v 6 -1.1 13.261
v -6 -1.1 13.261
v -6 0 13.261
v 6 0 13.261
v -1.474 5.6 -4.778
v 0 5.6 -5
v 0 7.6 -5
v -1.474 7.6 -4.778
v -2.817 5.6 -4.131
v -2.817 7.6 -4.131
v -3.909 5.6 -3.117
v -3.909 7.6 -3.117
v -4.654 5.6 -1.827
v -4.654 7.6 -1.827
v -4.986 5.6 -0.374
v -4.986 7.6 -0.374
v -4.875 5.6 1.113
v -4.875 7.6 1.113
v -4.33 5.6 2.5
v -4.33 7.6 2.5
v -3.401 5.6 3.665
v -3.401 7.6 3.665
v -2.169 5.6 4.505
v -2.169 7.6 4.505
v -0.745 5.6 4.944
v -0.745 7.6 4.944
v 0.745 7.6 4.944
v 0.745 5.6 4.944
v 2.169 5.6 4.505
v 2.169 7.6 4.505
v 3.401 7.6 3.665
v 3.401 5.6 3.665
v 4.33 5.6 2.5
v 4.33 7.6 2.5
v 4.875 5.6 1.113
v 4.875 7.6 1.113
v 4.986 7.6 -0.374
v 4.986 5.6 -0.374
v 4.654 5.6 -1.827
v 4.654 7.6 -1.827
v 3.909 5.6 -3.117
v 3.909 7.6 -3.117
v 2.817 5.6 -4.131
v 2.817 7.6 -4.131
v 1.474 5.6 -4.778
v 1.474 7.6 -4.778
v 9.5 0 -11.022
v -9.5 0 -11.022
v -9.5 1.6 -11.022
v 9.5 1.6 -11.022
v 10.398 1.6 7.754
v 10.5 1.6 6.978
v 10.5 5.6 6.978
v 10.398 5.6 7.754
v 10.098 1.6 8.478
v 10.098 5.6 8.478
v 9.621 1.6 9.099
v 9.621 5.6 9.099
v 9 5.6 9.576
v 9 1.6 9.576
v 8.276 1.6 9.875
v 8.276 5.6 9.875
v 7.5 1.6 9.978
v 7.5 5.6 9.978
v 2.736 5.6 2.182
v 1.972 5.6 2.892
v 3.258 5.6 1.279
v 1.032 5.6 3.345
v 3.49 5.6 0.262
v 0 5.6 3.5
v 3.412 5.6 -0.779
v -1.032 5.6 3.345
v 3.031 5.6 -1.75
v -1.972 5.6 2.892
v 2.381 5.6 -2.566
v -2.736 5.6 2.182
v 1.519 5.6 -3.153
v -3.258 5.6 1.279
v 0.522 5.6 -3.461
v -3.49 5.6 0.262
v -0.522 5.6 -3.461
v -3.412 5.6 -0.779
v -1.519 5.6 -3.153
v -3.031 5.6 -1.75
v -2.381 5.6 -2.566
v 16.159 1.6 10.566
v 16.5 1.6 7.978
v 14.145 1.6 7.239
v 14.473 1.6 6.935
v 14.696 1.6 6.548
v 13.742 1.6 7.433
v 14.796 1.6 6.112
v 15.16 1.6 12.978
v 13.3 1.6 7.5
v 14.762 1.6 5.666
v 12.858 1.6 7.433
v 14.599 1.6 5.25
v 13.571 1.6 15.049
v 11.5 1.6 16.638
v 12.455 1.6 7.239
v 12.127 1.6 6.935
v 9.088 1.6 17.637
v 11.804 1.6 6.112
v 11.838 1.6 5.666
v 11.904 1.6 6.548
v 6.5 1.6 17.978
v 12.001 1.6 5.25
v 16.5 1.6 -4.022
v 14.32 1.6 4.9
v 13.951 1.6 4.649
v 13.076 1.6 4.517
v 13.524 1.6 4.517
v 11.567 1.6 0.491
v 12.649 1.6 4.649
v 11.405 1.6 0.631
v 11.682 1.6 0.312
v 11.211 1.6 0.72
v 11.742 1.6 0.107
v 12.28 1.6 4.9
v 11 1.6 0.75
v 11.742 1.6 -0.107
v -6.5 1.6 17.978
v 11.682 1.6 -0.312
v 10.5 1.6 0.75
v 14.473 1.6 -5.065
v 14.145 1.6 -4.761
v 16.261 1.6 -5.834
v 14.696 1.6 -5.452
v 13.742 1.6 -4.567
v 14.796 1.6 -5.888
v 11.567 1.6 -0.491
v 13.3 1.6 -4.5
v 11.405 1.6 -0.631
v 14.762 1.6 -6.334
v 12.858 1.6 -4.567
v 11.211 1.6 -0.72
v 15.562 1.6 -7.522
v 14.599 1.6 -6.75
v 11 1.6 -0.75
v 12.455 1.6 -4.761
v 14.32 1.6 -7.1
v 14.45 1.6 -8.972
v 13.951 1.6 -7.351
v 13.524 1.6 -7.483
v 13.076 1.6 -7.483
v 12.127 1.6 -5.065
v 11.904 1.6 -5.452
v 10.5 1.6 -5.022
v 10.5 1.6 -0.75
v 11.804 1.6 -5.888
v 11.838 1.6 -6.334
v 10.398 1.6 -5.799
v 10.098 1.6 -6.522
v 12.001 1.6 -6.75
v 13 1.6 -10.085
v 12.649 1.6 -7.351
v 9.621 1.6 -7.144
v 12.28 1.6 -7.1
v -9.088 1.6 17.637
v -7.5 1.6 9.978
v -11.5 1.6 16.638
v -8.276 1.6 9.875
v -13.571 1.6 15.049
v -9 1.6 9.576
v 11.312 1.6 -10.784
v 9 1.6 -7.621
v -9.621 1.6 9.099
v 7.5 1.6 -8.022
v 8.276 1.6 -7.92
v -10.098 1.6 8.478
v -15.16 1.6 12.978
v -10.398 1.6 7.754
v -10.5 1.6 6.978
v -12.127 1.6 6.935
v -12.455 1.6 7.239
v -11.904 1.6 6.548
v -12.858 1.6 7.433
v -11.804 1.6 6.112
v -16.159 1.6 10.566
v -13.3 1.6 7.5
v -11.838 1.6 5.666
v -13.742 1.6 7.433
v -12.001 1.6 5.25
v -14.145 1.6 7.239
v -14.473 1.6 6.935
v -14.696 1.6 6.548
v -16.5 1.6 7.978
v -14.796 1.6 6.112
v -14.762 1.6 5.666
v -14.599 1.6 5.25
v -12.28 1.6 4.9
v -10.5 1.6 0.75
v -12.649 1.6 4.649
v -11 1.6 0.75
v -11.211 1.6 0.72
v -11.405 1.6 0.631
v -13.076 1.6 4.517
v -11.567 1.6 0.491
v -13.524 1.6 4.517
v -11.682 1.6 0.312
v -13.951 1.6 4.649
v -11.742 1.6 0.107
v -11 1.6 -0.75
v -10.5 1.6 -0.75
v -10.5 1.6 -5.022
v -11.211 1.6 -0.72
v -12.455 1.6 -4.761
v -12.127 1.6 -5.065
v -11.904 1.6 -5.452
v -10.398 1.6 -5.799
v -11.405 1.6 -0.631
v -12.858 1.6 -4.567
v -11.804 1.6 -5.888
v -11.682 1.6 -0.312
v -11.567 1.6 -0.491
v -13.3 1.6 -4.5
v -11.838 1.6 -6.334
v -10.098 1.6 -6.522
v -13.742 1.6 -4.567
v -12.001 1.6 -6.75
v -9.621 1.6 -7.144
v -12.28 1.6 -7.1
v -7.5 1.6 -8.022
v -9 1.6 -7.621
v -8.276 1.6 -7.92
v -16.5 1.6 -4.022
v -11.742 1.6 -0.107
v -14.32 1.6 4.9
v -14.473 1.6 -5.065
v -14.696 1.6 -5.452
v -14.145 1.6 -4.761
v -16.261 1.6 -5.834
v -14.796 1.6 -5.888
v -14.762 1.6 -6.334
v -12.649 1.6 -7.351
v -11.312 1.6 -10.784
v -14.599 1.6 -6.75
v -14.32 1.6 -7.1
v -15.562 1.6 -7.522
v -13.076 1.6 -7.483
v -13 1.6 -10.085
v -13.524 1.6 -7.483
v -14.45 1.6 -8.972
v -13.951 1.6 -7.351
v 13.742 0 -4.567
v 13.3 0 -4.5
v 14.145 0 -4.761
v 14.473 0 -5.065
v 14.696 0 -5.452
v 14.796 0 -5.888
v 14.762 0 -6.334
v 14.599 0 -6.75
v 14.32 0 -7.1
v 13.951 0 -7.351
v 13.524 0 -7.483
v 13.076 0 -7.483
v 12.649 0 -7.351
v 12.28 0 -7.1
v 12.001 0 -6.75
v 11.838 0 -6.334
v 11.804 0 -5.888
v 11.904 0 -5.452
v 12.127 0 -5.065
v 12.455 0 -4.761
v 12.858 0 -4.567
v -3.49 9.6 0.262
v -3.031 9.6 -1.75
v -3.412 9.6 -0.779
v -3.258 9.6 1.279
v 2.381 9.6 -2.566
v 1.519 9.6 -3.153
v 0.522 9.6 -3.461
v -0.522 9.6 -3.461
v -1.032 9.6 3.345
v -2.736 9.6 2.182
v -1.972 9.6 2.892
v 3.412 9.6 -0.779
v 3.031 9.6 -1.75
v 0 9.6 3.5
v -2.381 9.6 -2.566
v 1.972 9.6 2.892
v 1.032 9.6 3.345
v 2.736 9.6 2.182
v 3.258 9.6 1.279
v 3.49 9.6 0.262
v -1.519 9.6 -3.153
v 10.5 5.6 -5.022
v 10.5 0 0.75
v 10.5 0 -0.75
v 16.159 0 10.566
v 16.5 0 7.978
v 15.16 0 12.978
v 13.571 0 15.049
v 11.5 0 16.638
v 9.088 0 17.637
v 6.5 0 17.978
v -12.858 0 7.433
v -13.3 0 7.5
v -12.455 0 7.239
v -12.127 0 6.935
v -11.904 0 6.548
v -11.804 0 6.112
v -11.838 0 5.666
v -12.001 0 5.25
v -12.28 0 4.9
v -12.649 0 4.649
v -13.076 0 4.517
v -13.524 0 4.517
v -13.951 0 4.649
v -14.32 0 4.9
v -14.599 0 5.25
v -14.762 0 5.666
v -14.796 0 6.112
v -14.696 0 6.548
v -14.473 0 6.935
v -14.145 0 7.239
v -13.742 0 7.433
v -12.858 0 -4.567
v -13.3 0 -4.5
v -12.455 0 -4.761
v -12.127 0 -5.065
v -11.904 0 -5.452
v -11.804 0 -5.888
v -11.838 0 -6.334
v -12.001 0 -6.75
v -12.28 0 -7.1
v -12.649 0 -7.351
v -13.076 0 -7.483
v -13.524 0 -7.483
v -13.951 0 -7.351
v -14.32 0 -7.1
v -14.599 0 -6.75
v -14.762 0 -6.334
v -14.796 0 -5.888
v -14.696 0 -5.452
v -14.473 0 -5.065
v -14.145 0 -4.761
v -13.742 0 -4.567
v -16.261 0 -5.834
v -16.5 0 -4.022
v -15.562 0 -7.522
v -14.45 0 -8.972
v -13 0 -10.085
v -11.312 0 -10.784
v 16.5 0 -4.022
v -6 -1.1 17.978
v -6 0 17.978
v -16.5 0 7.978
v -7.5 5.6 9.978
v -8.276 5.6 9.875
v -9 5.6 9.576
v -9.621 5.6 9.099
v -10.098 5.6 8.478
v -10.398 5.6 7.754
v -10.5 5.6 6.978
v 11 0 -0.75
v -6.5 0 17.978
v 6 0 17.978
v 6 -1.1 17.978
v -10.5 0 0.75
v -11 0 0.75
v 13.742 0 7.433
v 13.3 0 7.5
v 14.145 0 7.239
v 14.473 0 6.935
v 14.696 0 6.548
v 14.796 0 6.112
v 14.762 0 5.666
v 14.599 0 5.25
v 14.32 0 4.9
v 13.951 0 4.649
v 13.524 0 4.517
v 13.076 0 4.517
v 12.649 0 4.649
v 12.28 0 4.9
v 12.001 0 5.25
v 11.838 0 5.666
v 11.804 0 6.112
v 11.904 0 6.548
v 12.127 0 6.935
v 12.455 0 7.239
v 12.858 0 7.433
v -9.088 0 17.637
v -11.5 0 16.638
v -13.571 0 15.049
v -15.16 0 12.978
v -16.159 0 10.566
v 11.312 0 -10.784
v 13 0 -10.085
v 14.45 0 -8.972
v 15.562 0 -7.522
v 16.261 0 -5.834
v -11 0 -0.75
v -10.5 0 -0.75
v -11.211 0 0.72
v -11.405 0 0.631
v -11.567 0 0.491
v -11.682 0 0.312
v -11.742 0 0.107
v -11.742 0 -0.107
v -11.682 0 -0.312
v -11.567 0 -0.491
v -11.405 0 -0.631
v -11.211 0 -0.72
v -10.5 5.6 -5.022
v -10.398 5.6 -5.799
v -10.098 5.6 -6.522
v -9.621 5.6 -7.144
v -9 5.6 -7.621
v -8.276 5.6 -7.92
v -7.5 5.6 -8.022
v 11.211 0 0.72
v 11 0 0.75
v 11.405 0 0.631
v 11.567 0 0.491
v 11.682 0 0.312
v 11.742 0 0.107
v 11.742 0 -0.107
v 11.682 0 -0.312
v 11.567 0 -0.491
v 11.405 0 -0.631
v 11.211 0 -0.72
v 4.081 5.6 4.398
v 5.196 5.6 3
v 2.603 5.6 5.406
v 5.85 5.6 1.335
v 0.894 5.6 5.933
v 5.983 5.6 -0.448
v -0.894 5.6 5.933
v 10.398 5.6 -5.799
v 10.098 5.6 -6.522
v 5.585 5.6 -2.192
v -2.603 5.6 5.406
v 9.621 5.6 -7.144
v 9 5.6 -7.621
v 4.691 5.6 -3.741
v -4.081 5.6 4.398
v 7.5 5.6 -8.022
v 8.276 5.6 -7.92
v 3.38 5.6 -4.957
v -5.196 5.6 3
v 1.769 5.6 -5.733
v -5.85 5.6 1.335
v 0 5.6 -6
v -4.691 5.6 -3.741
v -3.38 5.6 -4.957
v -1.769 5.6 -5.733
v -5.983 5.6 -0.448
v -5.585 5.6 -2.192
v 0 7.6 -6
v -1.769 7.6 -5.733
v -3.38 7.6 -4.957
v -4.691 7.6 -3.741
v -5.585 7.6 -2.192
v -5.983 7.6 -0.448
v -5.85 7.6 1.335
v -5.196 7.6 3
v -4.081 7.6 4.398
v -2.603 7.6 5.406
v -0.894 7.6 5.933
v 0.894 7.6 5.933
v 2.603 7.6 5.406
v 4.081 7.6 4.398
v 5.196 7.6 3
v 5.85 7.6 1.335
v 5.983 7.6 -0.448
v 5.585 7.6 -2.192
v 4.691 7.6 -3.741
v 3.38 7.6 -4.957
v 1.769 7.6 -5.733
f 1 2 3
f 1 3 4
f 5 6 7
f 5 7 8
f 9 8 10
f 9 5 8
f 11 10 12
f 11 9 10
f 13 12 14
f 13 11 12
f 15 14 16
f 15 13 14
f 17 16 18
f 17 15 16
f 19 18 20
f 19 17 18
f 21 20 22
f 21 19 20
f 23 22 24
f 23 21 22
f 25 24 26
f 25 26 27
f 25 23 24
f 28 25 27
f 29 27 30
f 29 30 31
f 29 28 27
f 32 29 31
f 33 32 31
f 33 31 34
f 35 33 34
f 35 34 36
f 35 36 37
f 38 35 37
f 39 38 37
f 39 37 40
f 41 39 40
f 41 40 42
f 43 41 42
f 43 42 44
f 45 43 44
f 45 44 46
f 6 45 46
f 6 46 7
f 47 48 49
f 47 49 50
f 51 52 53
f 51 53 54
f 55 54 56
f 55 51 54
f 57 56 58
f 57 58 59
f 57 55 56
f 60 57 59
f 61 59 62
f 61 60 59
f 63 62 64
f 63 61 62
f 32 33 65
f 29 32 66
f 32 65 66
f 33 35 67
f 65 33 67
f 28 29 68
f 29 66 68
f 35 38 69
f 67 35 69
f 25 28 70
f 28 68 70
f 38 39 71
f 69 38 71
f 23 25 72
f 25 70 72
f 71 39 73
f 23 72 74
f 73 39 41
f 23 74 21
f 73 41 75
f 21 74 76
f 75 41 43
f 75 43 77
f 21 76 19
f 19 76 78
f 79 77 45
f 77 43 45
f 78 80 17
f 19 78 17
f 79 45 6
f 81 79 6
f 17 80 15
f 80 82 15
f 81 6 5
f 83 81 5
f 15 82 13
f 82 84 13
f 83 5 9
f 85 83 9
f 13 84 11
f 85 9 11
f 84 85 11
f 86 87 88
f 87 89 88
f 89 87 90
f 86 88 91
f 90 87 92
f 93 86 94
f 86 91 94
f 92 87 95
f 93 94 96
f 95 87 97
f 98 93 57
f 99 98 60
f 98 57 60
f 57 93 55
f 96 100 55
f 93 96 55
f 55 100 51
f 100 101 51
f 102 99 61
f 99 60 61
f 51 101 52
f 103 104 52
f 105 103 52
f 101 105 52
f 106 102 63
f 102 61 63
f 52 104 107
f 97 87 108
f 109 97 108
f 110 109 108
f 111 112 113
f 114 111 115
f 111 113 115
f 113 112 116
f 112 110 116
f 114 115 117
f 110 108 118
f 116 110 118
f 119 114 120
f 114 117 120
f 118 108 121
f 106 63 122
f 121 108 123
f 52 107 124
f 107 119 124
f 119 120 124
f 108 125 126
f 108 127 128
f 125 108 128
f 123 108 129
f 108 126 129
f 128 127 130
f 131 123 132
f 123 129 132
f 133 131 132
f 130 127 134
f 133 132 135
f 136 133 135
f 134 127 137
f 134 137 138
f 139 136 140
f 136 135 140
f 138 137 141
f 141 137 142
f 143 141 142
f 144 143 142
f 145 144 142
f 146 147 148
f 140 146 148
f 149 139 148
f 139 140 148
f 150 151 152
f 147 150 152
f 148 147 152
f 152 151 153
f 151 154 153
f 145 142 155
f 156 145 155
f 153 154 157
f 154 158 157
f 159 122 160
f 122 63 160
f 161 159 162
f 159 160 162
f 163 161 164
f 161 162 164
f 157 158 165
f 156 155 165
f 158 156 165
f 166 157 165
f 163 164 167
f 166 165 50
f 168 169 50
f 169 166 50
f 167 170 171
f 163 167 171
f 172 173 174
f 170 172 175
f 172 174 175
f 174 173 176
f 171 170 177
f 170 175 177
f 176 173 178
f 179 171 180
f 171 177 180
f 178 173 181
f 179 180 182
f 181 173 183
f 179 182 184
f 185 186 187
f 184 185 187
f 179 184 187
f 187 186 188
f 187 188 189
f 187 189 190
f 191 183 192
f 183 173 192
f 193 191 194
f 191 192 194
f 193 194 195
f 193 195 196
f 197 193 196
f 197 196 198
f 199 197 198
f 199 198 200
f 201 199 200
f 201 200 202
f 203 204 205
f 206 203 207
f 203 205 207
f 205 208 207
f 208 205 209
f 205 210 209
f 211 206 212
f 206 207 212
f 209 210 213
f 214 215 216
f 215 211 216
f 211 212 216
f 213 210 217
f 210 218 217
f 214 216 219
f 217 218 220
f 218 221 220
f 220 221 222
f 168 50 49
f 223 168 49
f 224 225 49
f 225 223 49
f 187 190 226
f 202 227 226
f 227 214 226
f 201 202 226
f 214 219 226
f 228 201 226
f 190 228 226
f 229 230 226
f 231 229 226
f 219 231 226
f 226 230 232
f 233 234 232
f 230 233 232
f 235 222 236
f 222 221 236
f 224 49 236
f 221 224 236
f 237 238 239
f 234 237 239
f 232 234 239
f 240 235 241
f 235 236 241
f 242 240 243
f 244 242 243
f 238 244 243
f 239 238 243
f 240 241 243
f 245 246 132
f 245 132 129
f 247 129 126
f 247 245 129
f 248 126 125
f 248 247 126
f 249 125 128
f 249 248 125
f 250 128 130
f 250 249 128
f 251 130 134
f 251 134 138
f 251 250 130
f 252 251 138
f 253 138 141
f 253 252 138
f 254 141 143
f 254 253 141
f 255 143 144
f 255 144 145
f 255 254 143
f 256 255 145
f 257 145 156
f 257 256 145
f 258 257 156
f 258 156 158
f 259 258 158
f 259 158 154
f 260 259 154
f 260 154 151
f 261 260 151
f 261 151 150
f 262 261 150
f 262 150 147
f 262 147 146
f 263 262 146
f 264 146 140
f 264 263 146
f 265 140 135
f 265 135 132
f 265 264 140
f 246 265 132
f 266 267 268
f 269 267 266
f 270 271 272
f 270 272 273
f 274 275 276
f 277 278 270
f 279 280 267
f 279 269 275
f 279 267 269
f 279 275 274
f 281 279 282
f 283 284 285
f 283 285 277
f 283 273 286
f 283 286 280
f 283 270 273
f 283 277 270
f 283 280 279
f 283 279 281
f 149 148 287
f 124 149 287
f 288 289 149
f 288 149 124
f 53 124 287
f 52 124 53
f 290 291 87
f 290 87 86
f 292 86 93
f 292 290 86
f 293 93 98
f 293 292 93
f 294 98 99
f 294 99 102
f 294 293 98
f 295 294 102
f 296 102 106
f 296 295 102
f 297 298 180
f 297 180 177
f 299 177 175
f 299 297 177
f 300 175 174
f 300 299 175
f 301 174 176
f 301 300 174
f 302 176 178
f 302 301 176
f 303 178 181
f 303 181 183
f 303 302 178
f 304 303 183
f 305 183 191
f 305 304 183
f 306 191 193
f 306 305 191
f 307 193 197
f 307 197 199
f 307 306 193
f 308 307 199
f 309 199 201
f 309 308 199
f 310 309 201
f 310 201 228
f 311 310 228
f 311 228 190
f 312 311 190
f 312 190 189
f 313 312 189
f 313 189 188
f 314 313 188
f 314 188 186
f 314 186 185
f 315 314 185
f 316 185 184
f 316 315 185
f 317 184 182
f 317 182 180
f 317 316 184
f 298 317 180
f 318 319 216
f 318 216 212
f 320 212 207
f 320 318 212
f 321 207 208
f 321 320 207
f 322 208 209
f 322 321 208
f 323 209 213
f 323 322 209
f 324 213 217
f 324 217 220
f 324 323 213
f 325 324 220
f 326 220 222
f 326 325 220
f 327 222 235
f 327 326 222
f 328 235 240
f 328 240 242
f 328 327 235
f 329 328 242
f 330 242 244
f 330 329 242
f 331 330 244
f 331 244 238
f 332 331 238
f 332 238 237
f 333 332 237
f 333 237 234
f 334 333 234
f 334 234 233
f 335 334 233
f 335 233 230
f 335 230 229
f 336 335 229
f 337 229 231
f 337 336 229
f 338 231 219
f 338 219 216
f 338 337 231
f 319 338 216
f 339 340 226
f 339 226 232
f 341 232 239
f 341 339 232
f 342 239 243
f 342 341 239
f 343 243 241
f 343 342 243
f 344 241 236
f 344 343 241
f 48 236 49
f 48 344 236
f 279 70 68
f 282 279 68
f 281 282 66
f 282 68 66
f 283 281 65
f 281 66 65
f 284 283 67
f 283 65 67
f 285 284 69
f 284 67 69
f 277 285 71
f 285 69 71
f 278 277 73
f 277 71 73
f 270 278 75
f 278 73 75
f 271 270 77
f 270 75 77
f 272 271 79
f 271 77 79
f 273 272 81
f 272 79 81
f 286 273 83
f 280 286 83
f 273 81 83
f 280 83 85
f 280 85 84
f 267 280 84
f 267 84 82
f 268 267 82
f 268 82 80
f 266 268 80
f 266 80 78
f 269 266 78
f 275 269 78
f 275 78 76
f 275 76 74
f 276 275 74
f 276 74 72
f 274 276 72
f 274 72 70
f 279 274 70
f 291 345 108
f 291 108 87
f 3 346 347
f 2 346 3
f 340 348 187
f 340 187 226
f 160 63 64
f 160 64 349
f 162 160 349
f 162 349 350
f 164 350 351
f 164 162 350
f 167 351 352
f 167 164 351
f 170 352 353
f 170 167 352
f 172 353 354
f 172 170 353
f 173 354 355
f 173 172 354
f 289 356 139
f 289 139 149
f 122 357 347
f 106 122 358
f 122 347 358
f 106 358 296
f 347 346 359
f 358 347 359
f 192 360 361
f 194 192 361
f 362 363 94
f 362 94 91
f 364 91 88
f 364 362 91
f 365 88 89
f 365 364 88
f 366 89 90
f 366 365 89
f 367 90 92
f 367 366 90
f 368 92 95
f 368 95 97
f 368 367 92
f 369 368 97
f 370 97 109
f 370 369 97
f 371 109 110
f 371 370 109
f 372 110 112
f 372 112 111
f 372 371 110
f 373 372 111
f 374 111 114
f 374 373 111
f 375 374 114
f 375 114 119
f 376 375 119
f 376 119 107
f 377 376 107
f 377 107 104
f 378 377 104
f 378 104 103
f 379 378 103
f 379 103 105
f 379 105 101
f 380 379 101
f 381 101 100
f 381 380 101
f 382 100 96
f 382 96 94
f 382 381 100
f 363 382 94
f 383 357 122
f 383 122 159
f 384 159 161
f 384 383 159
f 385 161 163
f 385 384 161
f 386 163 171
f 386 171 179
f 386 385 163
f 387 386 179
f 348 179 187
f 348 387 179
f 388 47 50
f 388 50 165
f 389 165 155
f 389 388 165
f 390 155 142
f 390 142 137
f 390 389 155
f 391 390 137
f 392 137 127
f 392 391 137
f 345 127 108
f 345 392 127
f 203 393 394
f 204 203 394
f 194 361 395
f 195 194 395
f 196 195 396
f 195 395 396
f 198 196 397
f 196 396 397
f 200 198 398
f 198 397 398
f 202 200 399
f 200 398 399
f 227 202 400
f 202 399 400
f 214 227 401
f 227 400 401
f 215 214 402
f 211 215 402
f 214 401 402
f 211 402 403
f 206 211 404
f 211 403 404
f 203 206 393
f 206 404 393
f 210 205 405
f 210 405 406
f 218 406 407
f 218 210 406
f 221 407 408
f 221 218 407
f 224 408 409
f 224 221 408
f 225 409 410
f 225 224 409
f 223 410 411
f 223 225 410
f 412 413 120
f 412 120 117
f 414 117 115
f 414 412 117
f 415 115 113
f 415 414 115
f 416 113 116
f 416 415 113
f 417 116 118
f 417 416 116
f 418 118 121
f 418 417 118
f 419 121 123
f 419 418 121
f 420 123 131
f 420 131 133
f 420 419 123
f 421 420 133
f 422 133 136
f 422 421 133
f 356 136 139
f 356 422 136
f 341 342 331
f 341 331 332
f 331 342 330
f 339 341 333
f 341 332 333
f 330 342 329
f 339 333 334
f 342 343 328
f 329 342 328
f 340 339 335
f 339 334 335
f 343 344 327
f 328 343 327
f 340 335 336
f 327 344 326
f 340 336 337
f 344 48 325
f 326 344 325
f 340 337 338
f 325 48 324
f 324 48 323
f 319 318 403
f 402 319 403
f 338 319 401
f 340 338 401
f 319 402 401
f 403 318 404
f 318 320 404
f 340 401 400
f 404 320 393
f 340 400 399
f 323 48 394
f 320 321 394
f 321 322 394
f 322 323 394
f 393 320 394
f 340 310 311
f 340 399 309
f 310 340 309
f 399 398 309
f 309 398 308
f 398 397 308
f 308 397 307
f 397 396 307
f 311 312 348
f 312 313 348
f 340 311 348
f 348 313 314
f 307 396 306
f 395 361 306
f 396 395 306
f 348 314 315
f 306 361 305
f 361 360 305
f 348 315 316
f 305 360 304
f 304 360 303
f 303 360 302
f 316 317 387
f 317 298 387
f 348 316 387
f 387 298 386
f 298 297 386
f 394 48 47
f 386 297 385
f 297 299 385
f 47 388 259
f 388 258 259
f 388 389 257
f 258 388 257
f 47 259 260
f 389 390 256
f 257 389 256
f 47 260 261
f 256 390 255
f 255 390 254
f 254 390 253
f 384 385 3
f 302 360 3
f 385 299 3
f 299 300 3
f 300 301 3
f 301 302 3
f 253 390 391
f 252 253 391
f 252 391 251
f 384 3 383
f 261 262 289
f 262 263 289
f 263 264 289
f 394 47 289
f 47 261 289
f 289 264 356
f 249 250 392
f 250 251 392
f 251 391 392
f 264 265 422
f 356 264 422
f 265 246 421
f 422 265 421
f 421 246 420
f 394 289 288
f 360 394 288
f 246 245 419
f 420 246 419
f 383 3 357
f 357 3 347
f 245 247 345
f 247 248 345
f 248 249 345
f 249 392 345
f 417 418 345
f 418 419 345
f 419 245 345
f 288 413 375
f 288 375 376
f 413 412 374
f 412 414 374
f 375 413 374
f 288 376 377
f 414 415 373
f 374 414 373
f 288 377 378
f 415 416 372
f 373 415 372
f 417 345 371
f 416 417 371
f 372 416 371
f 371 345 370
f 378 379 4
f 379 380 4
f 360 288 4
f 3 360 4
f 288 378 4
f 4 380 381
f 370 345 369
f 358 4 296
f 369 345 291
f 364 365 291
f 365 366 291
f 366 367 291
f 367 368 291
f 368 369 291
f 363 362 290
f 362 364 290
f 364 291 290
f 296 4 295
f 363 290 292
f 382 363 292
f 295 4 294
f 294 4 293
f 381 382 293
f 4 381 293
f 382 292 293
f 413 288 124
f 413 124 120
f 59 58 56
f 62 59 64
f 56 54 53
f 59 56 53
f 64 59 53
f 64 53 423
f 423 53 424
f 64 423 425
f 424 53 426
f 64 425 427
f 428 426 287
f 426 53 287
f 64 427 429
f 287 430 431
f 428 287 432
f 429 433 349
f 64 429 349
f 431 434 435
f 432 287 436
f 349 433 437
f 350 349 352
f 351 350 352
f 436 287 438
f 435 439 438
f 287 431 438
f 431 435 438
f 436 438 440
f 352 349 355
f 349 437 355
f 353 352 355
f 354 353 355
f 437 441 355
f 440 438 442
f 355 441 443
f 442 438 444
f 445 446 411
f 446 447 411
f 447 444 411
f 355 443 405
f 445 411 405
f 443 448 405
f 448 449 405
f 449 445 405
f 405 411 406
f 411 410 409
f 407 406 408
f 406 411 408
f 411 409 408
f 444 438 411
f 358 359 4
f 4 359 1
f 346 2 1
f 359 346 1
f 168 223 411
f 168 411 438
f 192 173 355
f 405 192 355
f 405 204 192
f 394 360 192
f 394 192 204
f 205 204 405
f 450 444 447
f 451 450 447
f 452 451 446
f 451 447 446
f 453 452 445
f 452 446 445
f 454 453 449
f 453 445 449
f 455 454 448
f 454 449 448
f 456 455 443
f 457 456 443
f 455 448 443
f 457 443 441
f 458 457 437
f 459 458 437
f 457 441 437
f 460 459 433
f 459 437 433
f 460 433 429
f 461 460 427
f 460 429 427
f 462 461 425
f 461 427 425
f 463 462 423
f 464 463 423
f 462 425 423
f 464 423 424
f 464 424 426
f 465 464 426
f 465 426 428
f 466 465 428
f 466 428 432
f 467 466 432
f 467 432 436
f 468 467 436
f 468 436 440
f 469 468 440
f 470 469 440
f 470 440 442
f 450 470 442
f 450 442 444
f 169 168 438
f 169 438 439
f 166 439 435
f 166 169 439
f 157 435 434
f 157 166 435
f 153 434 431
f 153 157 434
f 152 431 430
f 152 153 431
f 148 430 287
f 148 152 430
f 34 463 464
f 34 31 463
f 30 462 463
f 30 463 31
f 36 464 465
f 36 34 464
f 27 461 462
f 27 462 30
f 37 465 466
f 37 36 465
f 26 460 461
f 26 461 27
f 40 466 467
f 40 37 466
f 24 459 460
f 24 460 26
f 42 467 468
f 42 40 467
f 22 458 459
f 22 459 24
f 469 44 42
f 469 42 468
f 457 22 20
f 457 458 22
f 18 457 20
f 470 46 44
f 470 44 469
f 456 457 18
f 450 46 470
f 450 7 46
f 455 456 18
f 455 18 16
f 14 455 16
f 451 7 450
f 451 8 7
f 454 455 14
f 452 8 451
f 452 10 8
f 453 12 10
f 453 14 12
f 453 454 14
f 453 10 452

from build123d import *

# Parameters (mm, degrees)
SKETCH_1_R           = 1.5
EXTRUDE_1_DEPTH      = 1.6
EXTRUDE_2_DEPTH      = 5.6
SKETCH_3_R           = 6
SKETCH_3_R_2         = 5
EXTRUDE_3_DEPTH      = 7.6
SKETCH_4_R           = 3.5
SKETCH_4_R_2         = 2.75
EXTRUDE_4_DEPTH      = 9.6
SKETCH_5_R           = 3.5
EXTRUDE_5_DEPTH      = 9.6
EXTRUDE_6_DEPTH      = 0.001
EXTRUDE_6_DEPTH_BACK = 1.1
SKETCH_7_W           = 12
SKETCH_7_H           = 4.716784086


with BuildPart() as part:
    # 草图1 → 凸台-拉伸1 (new body)
    with BuildSketch(Plane(origin=(0, 0, 0), x_dir=(1, 0, 0), z_dir=(0, 1, 0))):
        with BuildLine():
            Line((-9.5, 11.022466342), (9.5, 11.022466342))
            ThreePointArc((9.5, 11.022466342), (14.449747468, 8.97221381), (16.5, 4.022466342))
            Line((16.5, 4.022466342), (16.5, -7.977533658))
            ThreePointArc((16.5, -7.977533658), (13.571067812, -15.04860147), (6.5, -17.977533658))
            Line((6.5, -17.977533658), (-6.5, -17.977533658))
            ThreePointArc((-6.5, -17.977533658), (-13.571067812, -15.04860147), (-16.5, -7.977533658))
            Line((-16.5, -7.977533658), (-16.5, 4.022466342))
            ThreePointArc((-16.5, 4.022466342), (-14.449747468, 8.97221381), (-9.5, 11.022466342))
        make_face()
        with Locations(Location((-13.3, 6, 0), (0, 0, 270))):
            Circle(SKETCH_1_R, mode=Mode.SUBTRACT)
        with Locations(Location((13.3, 6, 0), (0, 0, 270))):
            Circle(SKETCH_1_R, mode=Mode.SUBTRACT)
        with Locations(Location((-13.3, -6, 0), (0, 0, 270))):
            Circle(SKETCH_1_R, mode=Mode.SUBTRACT)
        with Locations(Location((13.3, -6, 0), (0, 0, 270))):
            Circle(SKETCH_1_R, mode=Mode.SUBTRACT)
        with BuildLine():
            Line((-11, 0.75), (-10, 0.75))
            ThreePointArc((-10, 0.75), (-9.25, 0), (-10, -0.75))
            Line((-10, -0.75), (-11, -0.75))
            ThreePointArc((-11, -0.75), (-11.75, 0), (-11, 0.75))
        make_face(mode=Mode.SUBTRACT)
        with BuildLine():
            Line((11, 0.75), (10, 0.75))
            ThreePointArc((10, 0.75), (9.25, 0), (10, -0.75))
            Line((10, -0.75), (11, -0.75))
            ThreePointArc((11, -0.75), (11.75, 0), (11, 0.75))
        make_face(mode=Mode.SUBTRACT)
    extrude(amount=EXTRUDE_1_DEPTH)

    # 草图2 → 凸台-拉伸2 (add)
    with BuildSketch(Plane(origin=(0, 0, 0), x_dir=(1, 0, 0), z_dir=(0, 1, 0))):
        with BuildLine():
            Line((-7.5, 8.022466342), (7.5, 8.022466342))
            ThreePointArc((7.5, 8.022466342), (9.621320344, 7.143786685), (10.5, 5.022466342))
            Line((10.5, 5.022466342), (10.5, -6.977533658))
            ThreePointArc((10.5, -6.977533658), (9.621320344, -9.098854002), (7.5, -9.977533658))
            Line((7.5, -9.977533658), (-7.5, -9.977533658))
            ThreePointArc((-7.5, -9.977533658), (-9.621320344, -9.098854002), (-10.5, -6.977533658))
            Line((-10.5, -6.977533658), (-10.5, 5.022466342))
            ThreePointArc((-10.5, 5.022466342), (-9.621320344, 7.143786685), (-7.5, 8.022466342))
        make_face()
    extrude(amount=EXTRUDE_2_DEPTH)

    # 草图3 → 凸台-拉伸3 (add)
    with BuildSketch(Plane(origin=(0, 0, 0), x_dir=(1, 0, 0), z_dir=(0, 1, 0))):
        with Locations(Location((0, 0, 0), (0, 0, 90))):
            Circle(SKETCH_3_R)
        with Locations(Location((0, 0, 0), (0, 0, 90))):
            Circle(SKETCH_3_R_2, mode=Mode.SUBTRACT)
    extrude(amount=EXTRUDE_3_DEPTH)

    # 草图4 → 凸台-拉伸4 (add)
    with BuildSketch(Plane(origin=(0, 0, 0), x_dir=(1, 0, 0), z_dir=(0, 1, 0))):
        with Locations(Location((0, 0, 0), (0, 0, 270))):
            Circle(SKETCH_4_R)
        with Locations(Location((0, 0, 0), (0, 0, 270))):
            Circle(SKETCH_4_R_2, mode=Mode.SUBTRACT)
    extrude(amount=EXTRUDE_4_DEPTH)

    # 草图5 → 凸台-拉伸5 (add)
    with BuildSketch(Plane(origin=(0, 0, 0), x_dir=(1, 0, 0), z_dir=(0, 1, 0))):
        with Locations(Location((0, 0, 0), (0, 0, 270))):
            Circle(SKETCH_5_R)
    extrude(amount=EXTRUDE_5_DEPTH)

    # 草图7 → 凸台-拉伸6 (add, two sides: drawn at the far end of the back side and taken through both)
    with BuildSketch(Plane(origin=(0, 0, 0), x_dir=(1, 0, 0), z_dir=(0, 1, 0)).offset(-EXTRUDE_6_DEPTH_BACK)):
        with Locations((0, -15.619141615)):
            Rectangle(SKETCH_7_W, SKETCH_7_H)
    extrude(amount=EXTRUDE_6_DEPTH + EXTRUDE_6_DEPTH_BACK)


solid = part.part
